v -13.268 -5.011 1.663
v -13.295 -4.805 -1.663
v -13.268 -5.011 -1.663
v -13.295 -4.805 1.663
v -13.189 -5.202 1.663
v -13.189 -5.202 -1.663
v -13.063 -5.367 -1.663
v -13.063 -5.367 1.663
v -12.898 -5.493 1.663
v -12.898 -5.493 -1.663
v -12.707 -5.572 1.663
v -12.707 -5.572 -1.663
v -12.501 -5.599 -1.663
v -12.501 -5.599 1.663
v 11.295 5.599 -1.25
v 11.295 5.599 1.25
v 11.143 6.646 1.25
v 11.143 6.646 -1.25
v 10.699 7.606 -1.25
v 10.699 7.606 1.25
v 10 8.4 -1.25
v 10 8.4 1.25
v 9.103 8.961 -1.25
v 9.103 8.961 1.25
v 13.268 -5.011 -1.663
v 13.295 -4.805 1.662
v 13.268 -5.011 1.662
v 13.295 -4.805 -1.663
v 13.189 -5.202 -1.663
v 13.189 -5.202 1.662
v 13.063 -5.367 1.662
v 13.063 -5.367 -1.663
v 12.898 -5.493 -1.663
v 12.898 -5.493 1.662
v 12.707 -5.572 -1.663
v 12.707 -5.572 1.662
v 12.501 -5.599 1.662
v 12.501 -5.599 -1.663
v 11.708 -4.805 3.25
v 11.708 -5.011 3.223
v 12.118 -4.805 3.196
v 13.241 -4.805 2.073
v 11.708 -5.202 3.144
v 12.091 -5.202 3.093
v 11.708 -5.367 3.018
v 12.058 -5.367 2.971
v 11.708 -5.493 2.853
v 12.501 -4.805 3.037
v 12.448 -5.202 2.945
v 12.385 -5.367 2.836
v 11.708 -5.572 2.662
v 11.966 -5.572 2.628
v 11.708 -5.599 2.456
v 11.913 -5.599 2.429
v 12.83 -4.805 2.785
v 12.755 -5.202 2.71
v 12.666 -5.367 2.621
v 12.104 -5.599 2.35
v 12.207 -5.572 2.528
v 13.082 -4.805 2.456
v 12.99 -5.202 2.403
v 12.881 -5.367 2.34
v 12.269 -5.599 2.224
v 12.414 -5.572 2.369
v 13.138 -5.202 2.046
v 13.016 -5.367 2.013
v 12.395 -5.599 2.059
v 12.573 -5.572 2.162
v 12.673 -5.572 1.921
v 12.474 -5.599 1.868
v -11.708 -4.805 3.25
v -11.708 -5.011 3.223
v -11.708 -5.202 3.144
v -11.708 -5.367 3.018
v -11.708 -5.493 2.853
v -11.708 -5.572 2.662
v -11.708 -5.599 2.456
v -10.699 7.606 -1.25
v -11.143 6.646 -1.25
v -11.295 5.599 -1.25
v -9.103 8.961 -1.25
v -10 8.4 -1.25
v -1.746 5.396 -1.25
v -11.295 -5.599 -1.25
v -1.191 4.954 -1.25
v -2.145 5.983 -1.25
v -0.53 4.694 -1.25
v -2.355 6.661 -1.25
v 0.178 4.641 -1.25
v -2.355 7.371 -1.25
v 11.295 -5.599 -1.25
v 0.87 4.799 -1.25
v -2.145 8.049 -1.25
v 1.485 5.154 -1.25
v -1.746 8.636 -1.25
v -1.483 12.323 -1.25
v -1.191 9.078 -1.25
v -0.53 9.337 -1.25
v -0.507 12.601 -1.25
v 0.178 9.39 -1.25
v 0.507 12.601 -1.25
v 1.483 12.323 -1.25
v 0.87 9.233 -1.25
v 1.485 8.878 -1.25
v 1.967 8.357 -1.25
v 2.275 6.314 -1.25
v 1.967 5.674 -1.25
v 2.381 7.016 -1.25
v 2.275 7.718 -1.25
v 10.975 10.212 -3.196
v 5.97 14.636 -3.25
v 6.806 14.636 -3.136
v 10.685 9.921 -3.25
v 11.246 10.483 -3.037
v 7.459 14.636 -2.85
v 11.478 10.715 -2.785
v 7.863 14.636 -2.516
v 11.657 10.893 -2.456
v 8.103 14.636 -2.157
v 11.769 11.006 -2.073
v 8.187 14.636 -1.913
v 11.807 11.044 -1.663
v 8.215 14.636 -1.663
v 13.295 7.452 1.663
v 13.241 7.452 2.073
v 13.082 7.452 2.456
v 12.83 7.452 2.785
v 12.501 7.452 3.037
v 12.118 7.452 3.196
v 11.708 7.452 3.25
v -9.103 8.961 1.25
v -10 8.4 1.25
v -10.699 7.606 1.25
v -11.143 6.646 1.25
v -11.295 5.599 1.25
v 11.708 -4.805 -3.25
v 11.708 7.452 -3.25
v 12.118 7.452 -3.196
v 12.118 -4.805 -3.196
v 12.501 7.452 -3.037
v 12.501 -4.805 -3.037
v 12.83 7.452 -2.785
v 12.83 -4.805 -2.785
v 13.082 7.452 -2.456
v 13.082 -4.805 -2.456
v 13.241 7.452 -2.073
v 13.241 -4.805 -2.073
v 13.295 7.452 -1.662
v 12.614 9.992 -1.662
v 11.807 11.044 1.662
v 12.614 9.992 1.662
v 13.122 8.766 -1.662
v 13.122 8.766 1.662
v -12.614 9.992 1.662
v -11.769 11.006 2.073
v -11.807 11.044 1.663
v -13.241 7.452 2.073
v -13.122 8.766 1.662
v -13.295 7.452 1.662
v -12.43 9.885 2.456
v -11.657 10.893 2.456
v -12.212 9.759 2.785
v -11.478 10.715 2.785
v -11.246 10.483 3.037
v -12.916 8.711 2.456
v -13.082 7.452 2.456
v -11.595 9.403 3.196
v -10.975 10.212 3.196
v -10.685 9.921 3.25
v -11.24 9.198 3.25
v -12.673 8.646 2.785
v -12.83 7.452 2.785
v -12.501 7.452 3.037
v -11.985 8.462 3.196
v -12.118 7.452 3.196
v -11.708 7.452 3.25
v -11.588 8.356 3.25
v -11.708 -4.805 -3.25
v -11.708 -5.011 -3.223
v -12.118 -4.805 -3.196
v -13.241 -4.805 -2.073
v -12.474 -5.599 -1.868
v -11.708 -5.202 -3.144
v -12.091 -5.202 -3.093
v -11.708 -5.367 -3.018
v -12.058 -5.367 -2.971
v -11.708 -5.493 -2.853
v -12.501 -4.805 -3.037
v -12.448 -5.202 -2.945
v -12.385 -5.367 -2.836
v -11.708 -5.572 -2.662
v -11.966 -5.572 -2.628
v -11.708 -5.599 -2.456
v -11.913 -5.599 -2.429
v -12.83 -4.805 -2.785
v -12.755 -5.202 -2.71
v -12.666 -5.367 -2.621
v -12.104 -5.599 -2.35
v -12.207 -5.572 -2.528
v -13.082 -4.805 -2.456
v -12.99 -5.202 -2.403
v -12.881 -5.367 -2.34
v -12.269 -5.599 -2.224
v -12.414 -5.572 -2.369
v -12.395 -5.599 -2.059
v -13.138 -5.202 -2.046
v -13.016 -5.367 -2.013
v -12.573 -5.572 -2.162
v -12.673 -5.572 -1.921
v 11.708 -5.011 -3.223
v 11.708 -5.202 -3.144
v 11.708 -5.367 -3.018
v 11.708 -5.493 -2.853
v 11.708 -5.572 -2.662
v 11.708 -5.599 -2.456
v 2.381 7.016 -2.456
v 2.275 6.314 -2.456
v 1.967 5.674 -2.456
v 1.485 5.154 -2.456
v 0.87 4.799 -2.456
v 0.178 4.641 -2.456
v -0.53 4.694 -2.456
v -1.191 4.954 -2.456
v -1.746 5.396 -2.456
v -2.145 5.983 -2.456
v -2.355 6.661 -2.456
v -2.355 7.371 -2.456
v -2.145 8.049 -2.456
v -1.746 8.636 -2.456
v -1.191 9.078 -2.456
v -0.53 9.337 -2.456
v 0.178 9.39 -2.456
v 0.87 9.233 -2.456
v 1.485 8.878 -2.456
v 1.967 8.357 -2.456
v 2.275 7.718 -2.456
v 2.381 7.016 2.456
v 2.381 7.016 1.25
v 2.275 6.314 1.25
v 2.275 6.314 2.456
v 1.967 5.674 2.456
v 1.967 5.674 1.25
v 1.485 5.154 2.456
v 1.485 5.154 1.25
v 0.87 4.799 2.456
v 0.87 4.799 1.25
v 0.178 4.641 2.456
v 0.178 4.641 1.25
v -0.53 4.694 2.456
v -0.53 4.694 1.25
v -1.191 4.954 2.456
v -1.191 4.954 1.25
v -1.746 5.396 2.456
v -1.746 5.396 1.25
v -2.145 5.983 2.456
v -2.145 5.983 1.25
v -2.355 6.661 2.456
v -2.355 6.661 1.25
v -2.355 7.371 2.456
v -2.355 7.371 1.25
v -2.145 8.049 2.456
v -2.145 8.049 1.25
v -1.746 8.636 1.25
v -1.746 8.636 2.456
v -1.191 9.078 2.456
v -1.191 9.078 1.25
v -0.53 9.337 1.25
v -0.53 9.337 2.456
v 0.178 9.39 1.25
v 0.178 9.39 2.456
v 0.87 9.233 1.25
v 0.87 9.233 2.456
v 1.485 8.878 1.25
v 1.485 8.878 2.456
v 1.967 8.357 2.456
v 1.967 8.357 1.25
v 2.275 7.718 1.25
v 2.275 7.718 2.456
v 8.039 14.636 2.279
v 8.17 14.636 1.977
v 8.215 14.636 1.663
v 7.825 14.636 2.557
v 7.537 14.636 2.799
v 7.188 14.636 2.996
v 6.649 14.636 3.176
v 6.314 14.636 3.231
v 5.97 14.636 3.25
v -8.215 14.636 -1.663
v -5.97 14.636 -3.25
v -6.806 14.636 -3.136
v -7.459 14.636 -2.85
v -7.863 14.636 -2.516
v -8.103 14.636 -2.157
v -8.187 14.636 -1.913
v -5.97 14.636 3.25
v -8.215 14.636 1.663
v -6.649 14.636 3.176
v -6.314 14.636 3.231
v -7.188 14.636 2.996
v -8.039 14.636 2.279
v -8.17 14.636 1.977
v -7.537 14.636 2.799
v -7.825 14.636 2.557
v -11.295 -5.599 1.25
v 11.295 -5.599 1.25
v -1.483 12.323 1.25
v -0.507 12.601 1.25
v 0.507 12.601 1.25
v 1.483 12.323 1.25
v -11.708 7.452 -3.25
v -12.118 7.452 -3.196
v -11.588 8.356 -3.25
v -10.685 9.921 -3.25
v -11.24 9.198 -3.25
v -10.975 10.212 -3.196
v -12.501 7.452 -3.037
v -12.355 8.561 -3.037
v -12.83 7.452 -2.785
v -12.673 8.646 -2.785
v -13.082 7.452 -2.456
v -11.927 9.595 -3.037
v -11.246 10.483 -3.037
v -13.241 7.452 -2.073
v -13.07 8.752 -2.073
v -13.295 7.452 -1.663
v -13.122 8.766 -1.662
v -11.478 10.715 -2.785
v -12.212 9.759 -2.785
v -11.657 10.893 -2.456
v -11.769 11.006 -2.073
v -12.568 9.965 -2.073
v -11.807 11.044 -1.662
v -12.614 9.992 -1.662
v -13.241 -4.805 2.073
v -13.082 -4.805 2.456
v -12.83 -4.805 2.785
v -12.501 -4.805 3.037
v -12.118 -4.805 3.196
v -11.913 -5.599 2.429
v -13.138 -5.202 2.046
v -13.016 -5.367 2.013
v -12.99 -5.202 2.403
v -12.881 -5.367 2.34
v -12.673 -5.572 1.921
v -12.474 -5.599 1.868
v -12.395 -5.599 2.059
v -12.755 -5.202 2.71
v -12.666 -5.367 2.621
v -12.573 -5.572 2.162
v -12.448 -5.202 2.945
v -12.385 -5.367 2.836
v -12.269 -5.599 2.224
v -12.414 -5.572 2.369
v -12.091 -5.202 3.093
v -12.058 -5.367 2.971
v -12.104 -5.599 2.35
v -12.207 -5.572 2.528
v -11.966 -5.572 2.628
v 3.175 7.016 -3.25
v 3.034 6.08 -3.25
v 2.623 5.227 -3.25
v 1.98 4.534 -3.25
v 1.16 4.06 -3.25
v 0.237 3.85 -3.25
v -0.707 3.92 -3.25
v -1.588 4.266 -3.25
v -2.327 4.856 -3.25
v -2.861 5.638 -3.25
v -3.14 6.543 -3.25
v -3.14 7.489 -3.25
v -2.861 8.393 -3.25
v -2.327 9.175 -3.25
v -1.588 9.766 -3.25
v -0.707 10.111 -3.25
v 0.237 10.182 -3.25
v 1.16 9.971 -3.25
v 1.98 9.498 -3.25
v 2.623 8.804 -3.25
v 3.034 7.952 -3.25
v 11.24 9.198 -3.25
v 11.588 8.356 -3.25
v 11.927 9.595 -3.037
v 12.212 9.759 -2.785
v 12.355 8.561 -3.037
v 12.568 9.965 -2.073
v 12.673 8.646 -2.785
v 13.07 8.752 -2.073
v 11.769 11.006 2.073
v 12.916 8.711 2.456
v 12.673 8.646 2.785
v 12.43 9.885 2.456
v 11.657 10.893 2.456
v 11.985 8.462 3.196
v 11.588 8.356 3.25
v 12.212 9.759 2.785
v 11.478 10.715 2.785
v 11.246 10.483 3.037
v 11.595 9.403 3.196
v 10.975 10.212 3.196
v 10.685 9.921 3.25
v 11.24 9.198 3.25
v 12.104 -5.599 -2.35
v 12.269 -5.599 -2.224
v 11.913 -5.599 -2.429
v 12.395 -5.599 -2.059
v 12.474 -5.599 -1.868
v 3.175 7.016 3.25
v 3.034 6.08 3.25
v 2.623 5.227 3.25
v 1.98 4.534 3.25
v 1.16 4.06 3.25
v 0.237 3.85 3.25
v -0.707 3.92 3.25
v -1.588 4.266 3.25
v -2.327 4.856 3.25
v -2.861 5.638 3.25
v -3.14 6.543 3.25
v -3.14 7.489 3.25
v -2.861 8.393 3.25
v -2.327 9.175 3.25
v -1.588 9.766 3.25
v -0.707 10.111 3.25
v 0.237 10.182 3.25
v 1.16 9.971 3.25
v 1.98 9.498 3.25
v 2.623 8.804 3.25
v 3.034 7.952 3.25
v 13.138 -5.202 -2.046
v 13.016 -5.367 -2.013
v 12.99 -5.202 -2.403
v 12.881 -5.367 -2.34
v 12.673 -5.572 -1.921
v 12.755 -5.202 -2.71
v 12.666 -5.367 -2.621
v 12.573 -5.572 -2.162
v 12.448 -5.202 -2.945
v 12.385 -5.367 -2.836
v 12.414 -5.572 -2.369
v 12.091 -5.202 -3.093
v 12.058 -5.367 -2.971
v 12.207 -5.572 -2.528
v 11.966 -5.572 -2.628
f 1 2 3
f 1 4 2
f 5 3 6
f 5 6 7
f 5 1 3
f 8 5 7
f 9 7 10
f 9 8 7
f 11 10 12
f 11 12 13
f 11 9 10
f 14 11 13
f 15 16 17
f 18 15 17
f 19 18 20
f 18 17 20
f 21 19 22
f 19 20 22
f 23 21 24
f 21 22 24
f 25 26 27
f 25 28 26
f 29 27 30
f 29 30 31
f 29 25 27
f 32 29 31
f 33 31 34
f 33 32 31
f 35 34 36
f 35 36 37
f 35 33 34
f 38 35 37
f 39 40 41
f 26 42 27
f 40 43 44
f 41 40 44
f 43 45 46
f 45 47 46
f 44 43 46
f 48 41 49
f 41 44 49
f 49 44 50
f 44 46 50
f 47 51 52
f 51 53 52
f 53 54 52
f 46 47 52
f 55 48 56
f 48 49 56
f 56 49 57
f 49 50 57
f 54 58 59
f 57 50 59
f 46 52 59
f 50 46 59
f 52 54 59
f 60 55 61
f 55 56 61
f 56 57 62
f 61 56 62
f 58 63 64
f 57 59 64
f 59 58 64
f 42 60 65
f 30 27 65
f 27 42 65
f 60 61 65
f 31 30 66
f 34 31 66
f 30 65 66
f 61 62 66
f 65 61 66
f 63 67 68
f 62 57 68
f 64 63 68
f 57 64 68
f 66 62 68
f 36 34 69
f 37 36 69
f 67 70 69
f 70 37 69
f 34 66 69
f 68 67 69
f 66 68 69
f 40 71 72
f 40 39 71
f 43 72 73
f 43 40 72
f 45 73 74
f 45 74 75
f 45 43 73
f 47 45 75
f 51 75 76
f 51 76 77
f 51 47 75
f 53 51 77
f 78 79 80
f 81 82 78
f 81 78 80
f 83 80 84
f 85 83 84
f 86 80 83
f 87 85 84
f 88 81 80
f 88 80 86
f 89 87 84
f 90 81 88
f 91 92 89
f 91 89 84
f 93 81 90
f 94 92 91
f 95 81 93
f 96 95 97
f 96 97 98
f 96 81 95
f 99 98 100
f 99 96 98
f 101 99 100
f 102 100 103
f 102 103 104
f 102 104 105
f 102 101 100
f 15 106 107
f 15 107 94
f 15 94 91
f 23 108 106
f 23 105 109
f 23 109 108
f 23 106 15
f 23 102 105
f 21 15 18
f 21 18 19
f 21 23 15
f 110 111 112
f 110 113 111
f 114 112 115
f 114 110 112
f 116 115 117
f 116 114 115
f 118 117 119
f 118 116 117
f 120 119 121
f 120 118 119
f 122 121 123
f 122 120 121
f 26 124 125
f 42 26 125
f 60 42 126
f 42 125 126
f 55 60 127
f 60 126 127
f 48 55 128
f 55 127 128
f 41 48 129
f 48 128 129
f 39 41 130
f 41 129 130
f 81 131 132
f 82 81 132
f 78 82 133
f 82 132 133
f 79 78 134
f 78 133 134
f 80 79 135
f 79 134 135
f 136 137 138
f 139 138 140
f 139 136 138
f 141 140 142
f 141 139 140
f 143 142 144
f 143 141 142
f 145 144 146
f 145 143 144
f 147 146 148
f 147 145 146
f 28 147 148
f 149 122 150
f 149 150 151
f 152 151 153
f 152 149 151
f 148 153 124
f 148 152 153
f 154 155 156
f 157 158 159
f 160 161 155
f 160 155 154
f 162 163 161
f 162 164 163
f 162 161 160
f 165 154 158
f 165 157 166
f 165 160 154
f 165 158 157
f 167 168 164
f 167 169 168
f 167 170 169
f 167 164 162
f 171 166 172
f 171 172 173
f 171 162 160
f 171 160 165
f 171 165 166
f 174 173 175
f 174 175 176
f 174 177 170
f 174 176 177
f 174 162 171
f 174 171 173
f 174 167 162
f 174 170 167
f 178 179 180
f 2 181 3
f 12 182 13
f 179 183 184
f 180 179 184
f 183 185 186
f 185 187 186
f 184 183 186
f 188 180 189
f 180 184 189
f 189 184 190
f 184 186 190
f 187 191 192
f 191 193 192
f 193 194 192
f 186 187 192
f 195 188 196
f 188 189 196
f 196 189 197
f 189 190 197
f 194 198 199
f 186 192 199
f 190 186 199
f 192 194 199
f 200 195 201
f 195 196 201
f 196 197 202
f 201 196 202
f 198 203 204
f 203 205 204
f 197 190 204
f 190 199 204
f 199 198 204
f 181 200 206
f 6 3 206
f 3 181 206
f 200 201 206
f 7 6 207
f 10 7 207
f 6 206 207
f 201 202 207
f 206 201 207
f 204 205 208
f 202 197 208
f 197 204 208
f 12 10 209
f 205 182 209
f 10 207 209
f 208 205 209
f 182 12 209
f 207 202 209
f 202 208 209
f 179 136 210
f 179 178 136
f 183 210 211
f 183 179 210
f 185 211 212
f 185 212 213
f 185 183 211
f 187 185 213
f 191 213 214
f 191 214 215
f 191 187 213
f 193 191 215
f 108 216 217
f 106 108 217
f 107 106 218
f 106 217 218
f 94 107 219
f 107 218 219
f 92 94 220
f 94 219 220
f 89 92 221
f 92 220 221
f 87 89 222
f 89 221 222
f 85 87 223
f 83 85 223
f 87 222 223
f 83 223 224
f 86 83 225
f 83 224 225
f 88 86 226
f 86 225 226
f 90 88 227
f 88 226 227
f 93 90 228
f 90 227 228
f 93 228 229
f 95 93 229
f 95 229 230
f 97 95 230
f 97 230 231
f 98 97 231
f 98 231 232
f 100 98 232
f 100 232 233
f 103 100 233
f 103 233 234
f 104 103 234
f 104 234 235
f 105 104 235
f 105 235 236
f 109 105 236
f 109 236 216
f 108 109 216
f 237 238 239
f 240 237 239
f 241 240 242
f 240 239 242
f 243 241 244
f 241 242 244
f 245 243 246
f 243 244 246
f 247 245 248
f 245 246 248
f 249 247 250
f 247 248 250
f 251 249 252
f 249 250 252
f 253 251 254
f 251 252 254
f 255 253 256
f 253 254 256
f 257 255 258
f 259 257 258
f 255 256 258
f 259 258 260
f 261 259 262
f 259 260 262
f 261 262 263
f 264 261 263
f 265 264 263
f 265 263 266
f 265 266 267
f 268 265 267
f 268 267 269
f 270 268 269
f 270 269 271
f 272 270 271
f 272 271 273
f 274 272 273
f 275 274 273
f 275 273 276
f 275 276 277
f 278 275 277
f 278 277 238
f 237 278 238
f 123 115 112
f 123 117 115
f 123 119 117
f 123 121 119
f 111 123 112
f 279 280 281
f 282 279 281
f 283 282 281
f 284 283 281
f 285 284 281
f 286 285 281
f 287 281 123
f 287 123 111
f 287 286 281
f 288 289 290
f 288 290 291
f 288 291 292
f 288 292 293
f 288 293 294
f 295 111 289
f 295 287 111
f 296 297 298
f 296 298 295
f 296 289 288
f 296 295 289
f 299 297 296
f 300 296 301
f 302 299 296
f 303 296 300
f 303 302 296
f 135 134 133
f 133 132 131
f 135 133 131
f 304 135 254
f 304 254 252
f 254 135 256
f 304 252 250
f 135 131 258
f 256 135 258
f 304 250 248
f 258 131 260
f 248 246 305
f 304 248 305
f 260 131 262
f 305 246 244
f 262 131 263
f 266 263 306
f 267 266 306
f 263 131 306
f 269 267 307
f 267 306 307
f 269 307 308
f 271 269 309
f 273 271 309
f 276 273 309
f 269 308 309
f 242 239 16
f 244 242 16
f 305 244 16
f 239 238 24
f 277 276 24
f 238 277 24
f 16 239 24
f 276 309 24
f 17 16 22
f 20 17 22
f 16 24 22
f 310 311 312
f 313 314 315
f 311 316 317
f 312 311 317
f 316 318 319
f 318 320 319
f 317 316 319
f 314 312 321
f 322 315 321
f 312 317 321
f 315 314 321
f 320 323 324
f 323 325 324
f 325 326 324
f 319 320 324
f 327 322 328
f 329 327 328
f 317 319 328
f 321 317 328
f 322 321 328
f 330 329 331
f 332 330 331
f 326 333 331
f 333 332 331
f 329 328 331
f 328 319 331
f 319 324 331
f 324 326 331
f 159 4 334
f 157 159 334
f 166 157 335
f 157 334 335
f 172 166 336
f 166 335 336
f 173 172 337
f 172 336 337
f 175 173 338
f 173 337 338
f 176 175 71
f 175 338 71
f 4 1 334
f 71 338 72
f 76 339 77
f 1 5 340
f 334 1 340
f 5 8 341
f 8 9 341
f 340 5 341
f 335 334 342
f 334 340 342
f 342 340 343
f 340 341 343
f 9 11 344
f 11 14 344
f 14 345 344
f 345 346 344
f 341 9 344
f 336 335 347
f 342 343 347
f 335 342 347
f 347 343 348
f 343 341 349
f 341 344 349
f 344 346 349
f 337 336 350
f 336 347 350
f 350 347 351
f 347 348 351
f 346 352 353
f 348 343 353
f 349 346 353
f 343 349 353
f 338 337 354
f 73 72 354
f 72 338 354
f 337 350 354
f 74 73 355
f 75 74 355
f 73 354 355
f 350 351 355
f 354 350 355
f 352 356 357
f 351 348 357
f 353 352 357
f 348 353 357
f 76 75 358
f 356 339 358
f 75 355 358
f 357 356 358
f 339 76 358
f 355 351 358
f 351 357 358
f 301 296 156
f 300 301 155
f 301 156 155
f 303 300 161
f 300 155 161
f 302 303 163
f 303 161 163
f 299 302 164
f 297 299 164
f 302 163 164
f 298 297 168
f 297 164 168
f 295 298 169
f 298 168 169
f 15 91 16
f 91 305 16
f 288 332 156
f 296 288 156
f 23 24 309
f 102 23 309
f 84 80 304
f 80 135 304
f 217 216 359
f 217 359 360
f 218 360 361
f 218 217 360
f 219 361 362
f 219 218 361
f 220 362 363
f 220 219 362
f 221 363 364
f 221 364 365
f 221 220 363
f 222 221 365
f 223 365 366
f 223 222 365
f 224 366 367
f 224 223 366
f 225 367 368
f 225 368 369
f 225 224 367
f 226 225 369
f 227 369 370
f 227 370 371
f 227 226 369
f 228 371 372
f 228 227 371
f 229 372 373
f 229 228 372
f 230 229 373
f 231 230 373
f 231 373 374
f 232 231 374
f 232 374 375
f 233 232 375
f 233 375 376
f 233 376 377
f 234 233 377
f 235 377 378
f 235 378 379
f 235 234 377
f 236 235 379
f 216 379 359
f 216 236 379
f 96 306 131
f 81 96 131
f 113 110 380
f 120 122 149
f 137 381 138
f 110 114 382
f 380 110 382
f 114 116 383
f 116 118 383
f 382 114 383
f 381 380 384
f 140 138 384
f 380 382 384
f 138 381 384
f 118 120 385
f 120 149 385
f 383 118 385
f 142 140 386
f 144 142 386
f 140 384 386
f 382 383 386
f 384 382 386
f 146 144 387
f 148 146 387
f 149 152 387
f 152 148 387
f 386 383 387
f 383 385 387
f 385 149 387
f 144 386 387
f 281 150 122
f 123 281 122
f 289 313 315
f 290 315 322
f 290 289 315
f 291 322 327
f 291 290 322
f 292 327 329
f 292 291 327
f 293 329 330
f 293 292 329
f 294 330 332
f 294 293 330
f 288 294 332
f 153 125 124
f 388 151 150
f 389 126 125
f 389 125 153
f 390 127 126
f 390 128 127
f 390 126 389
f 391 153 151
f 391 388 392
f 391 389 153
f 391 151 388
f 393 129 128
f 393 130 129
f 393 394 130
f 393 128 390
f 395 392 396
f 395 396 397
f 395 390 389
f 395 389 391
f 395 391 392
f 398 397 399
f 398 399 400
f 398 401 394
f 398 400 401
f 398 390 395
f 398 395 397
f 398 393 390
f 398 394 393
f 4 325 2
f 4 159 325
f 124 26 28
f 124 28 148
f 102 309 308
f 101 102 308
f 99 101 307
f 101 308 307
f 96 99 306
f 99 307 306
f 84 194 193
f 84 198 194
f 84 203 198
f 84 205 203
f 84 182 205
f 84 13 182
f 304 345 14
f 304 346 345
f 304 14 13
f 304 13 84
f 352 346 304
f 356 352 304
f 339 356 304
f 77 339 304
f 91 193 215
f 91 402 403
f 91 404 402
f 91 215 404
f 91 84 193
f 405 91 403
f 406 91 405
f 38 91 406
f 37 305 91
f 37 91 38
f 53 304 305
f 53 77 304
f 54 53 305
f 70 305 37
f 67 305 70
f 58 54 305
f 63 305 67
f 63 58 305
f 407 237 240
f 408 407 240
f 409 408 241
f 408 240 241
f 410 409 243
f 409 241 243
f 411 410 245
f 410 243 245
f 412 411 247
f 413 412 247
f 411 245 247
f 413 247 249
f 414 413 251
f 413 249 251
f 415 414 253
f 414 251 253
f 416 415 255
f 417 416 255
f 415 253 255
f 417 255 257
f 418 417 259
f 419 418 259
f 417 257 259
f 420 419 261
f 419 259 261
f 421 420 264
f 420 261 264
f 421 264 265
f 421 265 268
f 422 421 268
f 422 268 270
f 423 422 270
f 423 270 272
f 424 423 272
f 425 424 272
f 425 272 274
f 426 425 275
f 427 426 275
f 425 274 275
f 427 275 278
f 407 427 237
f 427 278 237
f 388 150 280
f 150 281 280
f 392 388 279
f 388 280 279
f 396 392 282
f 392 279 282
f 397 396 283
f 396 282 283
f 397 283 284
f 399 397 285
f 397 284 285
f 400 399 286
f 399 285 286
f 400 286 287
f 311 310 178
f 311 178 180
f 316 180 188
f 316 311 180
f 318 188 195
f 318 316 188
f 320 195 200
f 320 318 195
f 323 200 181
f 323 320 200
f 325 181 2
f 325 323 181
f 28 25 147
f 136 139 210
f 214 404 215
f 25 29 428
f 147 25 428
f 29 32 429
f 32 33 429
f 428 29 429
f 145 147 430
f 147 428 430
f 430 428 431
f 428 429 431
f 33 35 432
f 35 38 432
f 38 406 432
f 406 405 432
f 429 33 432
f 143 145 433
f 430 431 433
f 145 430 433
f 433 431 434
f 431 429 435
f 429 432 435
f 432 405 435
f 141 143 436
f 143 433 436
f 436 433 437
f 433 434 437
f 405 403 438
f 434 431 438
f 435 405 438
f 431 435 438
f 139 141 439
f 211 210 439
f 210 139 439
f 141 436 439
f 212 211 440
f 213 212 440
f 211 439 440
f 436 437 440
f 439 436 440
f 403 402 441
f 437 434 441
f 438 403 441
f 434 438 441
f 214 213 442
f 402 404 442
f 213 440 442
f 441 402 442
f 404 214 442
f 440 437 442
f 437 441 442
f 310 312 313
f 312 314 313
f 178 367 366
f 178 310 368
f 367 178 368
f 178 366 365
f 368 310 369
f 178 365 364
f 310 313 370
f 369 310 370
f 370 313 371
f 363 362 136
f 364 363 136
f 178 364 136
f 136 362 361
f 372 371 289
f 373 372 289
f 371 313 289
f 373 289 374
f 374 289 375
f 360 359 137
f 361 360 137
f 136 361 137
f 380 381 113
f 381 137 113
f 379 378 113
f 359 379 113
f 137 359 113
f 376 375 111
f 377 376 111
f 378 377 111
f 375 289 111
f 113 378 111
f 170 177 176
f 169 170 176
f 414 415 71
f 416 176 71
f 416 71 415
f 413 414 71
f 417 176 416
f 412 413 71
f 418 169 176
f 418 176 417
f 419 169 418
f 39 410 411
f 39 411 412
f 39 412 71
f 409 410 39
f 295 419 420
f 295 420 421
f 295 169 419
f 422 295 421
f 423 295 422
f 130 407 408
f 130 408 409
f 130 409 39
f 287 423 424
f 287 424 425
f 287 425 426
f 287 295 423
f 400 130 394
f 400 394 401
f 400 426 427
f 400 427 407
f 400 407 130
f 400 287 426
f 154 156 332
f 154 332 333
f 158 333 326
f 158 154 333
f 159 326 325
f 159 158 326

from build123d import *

# Parameters (mm, degrees)
F1_DEPTH = 1.25
F2_T     = 2
F3_R     = 2.38125
F4_DEPTH = 6.501
F6_DEPTH = 3.25
F7_SIZE  = 5.08
F8_R     = 5.08
F9_R     = 1.5875
F10_SIZE = 0.79375
F11_R    = 0.79375


with BuildPart() as f1:
    # F0 (on Top) → F1 (new body, symmetric)
    with BuildSketch(Plane.XY):
        with BuildLine():
            ThreePointArc((1.2815576559, 11.8657501741), (0, 12.1358861541), (-1.2815576559, 11.8657501741))
            Line((-1.2815576559, 11.8657501741), (-8.9015576559, 8.5039854683))
            ThreePointArc((-8.9015576559, 8.5039854683), (-10.2798468525, 7.3328572186), (-10.795, 5.5991214483))
            Line((-10.795, 5.5991214483), (-10.795, -5.5991214483))
            Line((-10.795, -5.5991214483), (10.795, -5.5991214483))
            Line((10.795, -5.5991214483), (10.795, 5.5991214483))
            ThreePointArc((10.795, 5.5991214483), (10.2798468525, 7.3328572186), (8.9015576559, 8.5039854683))
            Line((8.9015576559, 8.5039854683), (1.2815576559, 11.8657501741))
        make_face()
        with BuildLine():
            Line((-8.9015576559, 8.5039854683), (-1.2815576559, 11.8657501741))
            ThreePointArc((-1.2815576559, 11.8657501741), (0, 12.1358861541), (1.2815576559, 11.8657501741))
            Line((1.2815576559, 11.8657501741), (8.9015576559, 8.5039854683))
            ThreePointArc((8.9015576559, 8.5039854683), (10.2798468525, 7.3328572186), (10.795, 5.5991214483))
            Line((10.795, 5.5991214483), (10.795, -5.5991214483))
            Line((10.795, -5.5991214483), (11.295, -5.5991214483))
            Line((11.295, -5.5991214483), (11.295, 5.5991214483))
            ThreePointArc((11.295, 5.5991214483), (10.6987203726, 7.6058864738), (9.1033777592, 8.961444369))
            Line((9.1033777592, 8.961444369), (1.4833777592, 12.3232090749))
            ThreePointArc((1.4833777592, 12.3232090749), (0, 12.6358861541), (-1.4833777592, 12.3232090749))
            Line((-1.4833777592, 12.3232090749), (-9.1033777592, 8.961444369))
            ThreePointArc((-9.1033777592, 8.961444369), (-10.6987203726, 7.6058864738), (-11.295, 5.5991214483))
            Line((-11.295, 5.5991214483), (-11.295, -5.5991214483))
            Line((-11.295, -5.5991214483), (-10.795, -5.5991214483))
            Line((-10.795, -5.5991214483), (-10.795, 5.5991214483))
            ThreePointArc((-10.795, 5.5991214483), (-10.2798468525, 7.3328572186), (-8.9015576559, 8.5039854683))
        make_face()
    extrude(amount=F1_DEPTH, both=True)

    # F2
    f2_openings = [f1.faces().sort_by_distance(p)[0] for p in [
        (0, -5.599121, 0),
    ]]
    offset(amount=F2_T, openings=f2_openings, kind=Kind.INTERSECTION)

    # F3 (on face) → F4 (cut, through all)
    with BuildSketch(Plane(origin=(0, 0, -3.25), x_dir=(1, 0, 0), z_dir=(0, 0, -1))):
        with Locations((0, -7.0158861541)):
            Circle(F3_R)
    extrude(amount=-F4_DEPTH, mode=Mode.SUBTRACT)

    # F5 (on Top) → F6 (join, symmetric)
    with BuildSketch(Plane.XY):
        with BuildLine():
            Line((-9.9106581723, 10.7912799722), (-2.2906581723, 14.1530446781))
            ThreePointArc((-2.2906581723, 14.1530446781), (-1.1704967699, 14.5138639419), (0, 14.6358861541))
            Line((0, 14.6358861541), (-13.295, 14.6358861541))
            Line((-13.295, 14.6358861541), (-13.295, 5.5991214483))
            ThreePointArc((-13.295, 5.5991214483), (-12.3742144529, 8.6980034944), (-9.9106581723, 10.7912799722))
        make_face()
        with BuildLine():
            Line((13.295, 14.6358861541), (0, 14.6358861541))
            ThreePointArc((0, 14.6358861541), (1.1704967699, 14.5138639419), (2.2906581723, 14.1530446781))
            Line((2.2906581723, 14.1530446781), (9.9106581723, 10.7912799722))
            ThreePointArc((9.9106581723, 10.7912799722), (12.3742144529, 8.6980034944), (13.295, 5.5991214483))
            Line((13.295, 5.5991214483), (13.295, 14.6358861541))
        make_face()
    extrude(amount=F6_DEPTH, both=True)

    # F7
    f7_edges = [f1.edges().sort_by_distance(p)[0] for p in [
        (-13.295, 14.635886, 0),
        (13.295, 14.635886, 0),
    ]]
    chamfer(f7_edges, length=F7_SIZE)

    # F8
    f8_edges = [f1.edges().sort_by_distance(p)[0] for p in [
        (-13.295, 9.555886, 0),
        (13.295, 9.555886, 0),
    ]]
    fillet(f8_edges, radius=F8_R)

    # F9
    f9_edges = [f1.edges().sort_by_distance(p)[0] for p in [
        (-13.295, 0.92628, -3.25),
        (-13.295, 0.92628, 3.25),
        (13.295, 0.92628, 3.25),
        (13.295, 0.92628, -3.25),
        (12.908308, 9.395713, -3.25),
        (10.011051, 12.839835, -3.25),
        (-12.908308, 9.395713, -3.25),
        (-10.011051, 12.839835, -3.25),
        (12.908308, 9.395713, 3.25),
        (10.011051, 12.839835, 3.25),
        (-12.908308, 9.395713, 3.25),
        (-10.011051, 12.839835, 3.25),
    ]]
    fillet(f9_edges, radius=F9_R)

    # F10
    f10_edges = [f1.edges().sort_by_distance(p)[0] for p in [
        (-2.38125, 7.015886, -3.25),
        (-2.38125, 7.015886, 3.25),
    ]]
    chamfer(f10_edges, length=F10_SIZE)

    # F11
    f11_edges = [f1.edges().sort_by_distance(p)[0] for p in [
        (0, -5.599121, -3.25),
        (0, -5.599121, 3.25),
        (12.830032, -5.599121, 2.785032),
        (-12.830032, -5.599121, 2.785032),
        (13.295, -5.599121, 0),
        (-13.295, -5.599121, 0),
        (12.830032, -5.599121, -2.785032),
        (-12.830032, -5.599121, -2.785032),
    ]]
    fillet(f11_edges, radius=F11_R)


solid = f1.part
